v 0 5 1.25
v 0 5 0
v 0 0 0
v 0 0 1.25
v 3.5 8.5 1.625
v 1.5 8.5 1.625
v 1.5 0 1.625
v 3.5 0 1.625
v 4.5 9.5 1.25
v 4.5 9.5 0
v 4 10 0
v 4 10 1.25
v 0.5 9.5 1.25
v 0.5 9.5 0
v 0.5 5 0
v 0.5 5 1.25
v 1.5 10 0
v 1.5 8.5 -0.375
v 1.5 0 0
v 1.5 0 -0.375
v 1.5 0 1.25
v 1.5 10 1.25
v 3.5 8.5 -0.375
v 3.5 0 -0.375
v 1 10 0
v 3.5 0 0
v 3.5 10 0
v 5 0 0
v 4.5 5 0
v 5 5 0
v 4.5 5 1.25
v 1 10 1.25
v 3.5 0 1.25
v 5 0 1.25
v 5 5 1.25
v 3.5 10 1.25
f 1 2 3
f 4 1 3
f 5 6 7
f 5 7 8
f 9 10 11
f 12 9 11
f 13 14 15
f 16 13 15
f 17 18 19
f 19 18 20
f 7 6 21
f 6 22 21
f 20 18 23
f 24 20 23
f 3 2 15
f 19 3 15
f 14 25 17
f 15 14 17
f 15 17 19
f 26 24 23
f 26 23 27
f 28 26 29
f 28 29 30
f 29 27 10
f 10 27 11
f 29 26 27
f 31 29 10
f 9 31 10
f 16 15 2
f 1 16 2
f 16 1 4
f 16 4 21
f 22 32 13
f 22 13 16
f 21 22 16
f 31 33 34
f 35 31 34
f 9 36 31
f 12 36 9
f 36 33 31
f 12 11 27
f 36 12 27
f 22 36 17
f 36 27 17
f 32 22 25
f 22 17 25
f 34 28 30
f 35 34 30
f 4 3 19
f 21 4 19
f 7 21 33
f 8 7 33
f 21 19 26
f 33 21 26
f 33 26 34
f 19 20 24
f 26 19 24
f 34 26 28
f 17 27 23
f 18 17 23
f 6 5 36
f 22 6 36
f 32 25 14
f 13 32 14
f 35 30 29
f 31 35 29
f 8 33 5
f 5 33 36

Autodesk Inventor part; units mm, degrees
ref_plane "Plan YZ" through (0, 0, 0) normal (1, 0, 0) x (0, 1, 0)
ref_plane "Plan XZ" through (0, 0, 0) normal (0, 1, 0) x (-1, 0, 0)
ref_plane "Plan XY" through (0, 0, 0) normal (0, 0, 1) x (1, 0, 0)
sketch "Esquisse1" plane through (0, 0, 0) normal (0, 0, 1) x (1, 0, 0)
  line L0 (0, 0) -> (5, 0)
  line L1 (5, 0) -> (5, 5)
  line L2 (5, 5) -> (4.5, 5)
  line L3 (4.5, 5) -> (4.5, 10)
  line L4 (4.5, 10) -> (0.5, 10)
  line L5 (0.5, 10) -> (0.5, 5)
  line L6 (0.5, 5) -> (0, 5)
  line L7 (0, 5) -> (0, 0)
  dimension "d0" = 5
  dimension "d1" = 5
  dimension "d2" = 5
  dimension "d3" = 4
extrude "Extrusion1" add sketch "Esquisse1" along normal blind 1.25
sketch "Esquisse6" plane through (0, 0, 1.25) normal (0, 0, 1) x (1, 0, 0)
  line L0 (1.5, 0) -> (3.5, 0)
  line L1 (3.5, 0) -> (3.5, 10)
  line L2 (3.5, 10) -> (1.5, 10)
  line L3 (1.5, 10) -> (1.5, 0)
  line L4 (4.5, 10) -> (0.5, 10) projected
  line L5 (0, 0) -> (5, 0) projected
  line L6 (4.5, 5) -> (3.5, 5) construction
  line L7 (0.5, 5) -> (1.5, 5) construction
  dimension "d6" = 2
extrude "Extrusion2" add sketch "Esquisse6" along normal blind 0.375 and the other way blind 1.625
sketch "Esquisse7" plane through (3.5, 0, 1.25) normal (1, 0, 0) x (0, 0, -1)
  line L0 (0, 10) -> (-0.375, 10)
  line L1 (-0.375, 10) -> (-0.375, 8.5)
  line L2 (-0.375, 8.5) -> (0, 10)
  line L3 (1.25, 10) -> (1.625, 8.5)
  line L4 (1.625, 8.5) -> (1.625, 10)
  line L5 (1.625, 10) -> (1.25, 10)
  point P0 (1.25, 0)
  dimension "d11" = 1.5
  dimension "d12" = 1.5
extrude "Extrusion3" cut sketch "Esquisse7" against normal blind 2
sketch "Esquisse8" plane through (0, 0, 0) normal (0, 0, -1) x (-1, 0, 0)
  line L0 (-4.5, 9.5) -> (-4, 10)
  line L1 (-4, 10) -> (-4.5, 10)
  line L2 (-4.5, 10) -> (-4.5, 9.5)
  line L3 (-1, 10) -> (-0.5, 9.5)
  line L4 (-0.5, 9.5) -> (-0.5, 10)
  line L5 (-0.5, 10) -> (-1, 10)
  point P0 (0, 0)
  point P1 (-0.5, 10)
  dimension "d15" = 0.5
extrude "Extrusion4" cut sketch "Esquisse8" against normal blind 1.25
equation "\"d1\" = d0"
equation "\"d2\" = d1"
equation "\"d12\" = d11"
properties part number "P1704_009_slider" material "."
